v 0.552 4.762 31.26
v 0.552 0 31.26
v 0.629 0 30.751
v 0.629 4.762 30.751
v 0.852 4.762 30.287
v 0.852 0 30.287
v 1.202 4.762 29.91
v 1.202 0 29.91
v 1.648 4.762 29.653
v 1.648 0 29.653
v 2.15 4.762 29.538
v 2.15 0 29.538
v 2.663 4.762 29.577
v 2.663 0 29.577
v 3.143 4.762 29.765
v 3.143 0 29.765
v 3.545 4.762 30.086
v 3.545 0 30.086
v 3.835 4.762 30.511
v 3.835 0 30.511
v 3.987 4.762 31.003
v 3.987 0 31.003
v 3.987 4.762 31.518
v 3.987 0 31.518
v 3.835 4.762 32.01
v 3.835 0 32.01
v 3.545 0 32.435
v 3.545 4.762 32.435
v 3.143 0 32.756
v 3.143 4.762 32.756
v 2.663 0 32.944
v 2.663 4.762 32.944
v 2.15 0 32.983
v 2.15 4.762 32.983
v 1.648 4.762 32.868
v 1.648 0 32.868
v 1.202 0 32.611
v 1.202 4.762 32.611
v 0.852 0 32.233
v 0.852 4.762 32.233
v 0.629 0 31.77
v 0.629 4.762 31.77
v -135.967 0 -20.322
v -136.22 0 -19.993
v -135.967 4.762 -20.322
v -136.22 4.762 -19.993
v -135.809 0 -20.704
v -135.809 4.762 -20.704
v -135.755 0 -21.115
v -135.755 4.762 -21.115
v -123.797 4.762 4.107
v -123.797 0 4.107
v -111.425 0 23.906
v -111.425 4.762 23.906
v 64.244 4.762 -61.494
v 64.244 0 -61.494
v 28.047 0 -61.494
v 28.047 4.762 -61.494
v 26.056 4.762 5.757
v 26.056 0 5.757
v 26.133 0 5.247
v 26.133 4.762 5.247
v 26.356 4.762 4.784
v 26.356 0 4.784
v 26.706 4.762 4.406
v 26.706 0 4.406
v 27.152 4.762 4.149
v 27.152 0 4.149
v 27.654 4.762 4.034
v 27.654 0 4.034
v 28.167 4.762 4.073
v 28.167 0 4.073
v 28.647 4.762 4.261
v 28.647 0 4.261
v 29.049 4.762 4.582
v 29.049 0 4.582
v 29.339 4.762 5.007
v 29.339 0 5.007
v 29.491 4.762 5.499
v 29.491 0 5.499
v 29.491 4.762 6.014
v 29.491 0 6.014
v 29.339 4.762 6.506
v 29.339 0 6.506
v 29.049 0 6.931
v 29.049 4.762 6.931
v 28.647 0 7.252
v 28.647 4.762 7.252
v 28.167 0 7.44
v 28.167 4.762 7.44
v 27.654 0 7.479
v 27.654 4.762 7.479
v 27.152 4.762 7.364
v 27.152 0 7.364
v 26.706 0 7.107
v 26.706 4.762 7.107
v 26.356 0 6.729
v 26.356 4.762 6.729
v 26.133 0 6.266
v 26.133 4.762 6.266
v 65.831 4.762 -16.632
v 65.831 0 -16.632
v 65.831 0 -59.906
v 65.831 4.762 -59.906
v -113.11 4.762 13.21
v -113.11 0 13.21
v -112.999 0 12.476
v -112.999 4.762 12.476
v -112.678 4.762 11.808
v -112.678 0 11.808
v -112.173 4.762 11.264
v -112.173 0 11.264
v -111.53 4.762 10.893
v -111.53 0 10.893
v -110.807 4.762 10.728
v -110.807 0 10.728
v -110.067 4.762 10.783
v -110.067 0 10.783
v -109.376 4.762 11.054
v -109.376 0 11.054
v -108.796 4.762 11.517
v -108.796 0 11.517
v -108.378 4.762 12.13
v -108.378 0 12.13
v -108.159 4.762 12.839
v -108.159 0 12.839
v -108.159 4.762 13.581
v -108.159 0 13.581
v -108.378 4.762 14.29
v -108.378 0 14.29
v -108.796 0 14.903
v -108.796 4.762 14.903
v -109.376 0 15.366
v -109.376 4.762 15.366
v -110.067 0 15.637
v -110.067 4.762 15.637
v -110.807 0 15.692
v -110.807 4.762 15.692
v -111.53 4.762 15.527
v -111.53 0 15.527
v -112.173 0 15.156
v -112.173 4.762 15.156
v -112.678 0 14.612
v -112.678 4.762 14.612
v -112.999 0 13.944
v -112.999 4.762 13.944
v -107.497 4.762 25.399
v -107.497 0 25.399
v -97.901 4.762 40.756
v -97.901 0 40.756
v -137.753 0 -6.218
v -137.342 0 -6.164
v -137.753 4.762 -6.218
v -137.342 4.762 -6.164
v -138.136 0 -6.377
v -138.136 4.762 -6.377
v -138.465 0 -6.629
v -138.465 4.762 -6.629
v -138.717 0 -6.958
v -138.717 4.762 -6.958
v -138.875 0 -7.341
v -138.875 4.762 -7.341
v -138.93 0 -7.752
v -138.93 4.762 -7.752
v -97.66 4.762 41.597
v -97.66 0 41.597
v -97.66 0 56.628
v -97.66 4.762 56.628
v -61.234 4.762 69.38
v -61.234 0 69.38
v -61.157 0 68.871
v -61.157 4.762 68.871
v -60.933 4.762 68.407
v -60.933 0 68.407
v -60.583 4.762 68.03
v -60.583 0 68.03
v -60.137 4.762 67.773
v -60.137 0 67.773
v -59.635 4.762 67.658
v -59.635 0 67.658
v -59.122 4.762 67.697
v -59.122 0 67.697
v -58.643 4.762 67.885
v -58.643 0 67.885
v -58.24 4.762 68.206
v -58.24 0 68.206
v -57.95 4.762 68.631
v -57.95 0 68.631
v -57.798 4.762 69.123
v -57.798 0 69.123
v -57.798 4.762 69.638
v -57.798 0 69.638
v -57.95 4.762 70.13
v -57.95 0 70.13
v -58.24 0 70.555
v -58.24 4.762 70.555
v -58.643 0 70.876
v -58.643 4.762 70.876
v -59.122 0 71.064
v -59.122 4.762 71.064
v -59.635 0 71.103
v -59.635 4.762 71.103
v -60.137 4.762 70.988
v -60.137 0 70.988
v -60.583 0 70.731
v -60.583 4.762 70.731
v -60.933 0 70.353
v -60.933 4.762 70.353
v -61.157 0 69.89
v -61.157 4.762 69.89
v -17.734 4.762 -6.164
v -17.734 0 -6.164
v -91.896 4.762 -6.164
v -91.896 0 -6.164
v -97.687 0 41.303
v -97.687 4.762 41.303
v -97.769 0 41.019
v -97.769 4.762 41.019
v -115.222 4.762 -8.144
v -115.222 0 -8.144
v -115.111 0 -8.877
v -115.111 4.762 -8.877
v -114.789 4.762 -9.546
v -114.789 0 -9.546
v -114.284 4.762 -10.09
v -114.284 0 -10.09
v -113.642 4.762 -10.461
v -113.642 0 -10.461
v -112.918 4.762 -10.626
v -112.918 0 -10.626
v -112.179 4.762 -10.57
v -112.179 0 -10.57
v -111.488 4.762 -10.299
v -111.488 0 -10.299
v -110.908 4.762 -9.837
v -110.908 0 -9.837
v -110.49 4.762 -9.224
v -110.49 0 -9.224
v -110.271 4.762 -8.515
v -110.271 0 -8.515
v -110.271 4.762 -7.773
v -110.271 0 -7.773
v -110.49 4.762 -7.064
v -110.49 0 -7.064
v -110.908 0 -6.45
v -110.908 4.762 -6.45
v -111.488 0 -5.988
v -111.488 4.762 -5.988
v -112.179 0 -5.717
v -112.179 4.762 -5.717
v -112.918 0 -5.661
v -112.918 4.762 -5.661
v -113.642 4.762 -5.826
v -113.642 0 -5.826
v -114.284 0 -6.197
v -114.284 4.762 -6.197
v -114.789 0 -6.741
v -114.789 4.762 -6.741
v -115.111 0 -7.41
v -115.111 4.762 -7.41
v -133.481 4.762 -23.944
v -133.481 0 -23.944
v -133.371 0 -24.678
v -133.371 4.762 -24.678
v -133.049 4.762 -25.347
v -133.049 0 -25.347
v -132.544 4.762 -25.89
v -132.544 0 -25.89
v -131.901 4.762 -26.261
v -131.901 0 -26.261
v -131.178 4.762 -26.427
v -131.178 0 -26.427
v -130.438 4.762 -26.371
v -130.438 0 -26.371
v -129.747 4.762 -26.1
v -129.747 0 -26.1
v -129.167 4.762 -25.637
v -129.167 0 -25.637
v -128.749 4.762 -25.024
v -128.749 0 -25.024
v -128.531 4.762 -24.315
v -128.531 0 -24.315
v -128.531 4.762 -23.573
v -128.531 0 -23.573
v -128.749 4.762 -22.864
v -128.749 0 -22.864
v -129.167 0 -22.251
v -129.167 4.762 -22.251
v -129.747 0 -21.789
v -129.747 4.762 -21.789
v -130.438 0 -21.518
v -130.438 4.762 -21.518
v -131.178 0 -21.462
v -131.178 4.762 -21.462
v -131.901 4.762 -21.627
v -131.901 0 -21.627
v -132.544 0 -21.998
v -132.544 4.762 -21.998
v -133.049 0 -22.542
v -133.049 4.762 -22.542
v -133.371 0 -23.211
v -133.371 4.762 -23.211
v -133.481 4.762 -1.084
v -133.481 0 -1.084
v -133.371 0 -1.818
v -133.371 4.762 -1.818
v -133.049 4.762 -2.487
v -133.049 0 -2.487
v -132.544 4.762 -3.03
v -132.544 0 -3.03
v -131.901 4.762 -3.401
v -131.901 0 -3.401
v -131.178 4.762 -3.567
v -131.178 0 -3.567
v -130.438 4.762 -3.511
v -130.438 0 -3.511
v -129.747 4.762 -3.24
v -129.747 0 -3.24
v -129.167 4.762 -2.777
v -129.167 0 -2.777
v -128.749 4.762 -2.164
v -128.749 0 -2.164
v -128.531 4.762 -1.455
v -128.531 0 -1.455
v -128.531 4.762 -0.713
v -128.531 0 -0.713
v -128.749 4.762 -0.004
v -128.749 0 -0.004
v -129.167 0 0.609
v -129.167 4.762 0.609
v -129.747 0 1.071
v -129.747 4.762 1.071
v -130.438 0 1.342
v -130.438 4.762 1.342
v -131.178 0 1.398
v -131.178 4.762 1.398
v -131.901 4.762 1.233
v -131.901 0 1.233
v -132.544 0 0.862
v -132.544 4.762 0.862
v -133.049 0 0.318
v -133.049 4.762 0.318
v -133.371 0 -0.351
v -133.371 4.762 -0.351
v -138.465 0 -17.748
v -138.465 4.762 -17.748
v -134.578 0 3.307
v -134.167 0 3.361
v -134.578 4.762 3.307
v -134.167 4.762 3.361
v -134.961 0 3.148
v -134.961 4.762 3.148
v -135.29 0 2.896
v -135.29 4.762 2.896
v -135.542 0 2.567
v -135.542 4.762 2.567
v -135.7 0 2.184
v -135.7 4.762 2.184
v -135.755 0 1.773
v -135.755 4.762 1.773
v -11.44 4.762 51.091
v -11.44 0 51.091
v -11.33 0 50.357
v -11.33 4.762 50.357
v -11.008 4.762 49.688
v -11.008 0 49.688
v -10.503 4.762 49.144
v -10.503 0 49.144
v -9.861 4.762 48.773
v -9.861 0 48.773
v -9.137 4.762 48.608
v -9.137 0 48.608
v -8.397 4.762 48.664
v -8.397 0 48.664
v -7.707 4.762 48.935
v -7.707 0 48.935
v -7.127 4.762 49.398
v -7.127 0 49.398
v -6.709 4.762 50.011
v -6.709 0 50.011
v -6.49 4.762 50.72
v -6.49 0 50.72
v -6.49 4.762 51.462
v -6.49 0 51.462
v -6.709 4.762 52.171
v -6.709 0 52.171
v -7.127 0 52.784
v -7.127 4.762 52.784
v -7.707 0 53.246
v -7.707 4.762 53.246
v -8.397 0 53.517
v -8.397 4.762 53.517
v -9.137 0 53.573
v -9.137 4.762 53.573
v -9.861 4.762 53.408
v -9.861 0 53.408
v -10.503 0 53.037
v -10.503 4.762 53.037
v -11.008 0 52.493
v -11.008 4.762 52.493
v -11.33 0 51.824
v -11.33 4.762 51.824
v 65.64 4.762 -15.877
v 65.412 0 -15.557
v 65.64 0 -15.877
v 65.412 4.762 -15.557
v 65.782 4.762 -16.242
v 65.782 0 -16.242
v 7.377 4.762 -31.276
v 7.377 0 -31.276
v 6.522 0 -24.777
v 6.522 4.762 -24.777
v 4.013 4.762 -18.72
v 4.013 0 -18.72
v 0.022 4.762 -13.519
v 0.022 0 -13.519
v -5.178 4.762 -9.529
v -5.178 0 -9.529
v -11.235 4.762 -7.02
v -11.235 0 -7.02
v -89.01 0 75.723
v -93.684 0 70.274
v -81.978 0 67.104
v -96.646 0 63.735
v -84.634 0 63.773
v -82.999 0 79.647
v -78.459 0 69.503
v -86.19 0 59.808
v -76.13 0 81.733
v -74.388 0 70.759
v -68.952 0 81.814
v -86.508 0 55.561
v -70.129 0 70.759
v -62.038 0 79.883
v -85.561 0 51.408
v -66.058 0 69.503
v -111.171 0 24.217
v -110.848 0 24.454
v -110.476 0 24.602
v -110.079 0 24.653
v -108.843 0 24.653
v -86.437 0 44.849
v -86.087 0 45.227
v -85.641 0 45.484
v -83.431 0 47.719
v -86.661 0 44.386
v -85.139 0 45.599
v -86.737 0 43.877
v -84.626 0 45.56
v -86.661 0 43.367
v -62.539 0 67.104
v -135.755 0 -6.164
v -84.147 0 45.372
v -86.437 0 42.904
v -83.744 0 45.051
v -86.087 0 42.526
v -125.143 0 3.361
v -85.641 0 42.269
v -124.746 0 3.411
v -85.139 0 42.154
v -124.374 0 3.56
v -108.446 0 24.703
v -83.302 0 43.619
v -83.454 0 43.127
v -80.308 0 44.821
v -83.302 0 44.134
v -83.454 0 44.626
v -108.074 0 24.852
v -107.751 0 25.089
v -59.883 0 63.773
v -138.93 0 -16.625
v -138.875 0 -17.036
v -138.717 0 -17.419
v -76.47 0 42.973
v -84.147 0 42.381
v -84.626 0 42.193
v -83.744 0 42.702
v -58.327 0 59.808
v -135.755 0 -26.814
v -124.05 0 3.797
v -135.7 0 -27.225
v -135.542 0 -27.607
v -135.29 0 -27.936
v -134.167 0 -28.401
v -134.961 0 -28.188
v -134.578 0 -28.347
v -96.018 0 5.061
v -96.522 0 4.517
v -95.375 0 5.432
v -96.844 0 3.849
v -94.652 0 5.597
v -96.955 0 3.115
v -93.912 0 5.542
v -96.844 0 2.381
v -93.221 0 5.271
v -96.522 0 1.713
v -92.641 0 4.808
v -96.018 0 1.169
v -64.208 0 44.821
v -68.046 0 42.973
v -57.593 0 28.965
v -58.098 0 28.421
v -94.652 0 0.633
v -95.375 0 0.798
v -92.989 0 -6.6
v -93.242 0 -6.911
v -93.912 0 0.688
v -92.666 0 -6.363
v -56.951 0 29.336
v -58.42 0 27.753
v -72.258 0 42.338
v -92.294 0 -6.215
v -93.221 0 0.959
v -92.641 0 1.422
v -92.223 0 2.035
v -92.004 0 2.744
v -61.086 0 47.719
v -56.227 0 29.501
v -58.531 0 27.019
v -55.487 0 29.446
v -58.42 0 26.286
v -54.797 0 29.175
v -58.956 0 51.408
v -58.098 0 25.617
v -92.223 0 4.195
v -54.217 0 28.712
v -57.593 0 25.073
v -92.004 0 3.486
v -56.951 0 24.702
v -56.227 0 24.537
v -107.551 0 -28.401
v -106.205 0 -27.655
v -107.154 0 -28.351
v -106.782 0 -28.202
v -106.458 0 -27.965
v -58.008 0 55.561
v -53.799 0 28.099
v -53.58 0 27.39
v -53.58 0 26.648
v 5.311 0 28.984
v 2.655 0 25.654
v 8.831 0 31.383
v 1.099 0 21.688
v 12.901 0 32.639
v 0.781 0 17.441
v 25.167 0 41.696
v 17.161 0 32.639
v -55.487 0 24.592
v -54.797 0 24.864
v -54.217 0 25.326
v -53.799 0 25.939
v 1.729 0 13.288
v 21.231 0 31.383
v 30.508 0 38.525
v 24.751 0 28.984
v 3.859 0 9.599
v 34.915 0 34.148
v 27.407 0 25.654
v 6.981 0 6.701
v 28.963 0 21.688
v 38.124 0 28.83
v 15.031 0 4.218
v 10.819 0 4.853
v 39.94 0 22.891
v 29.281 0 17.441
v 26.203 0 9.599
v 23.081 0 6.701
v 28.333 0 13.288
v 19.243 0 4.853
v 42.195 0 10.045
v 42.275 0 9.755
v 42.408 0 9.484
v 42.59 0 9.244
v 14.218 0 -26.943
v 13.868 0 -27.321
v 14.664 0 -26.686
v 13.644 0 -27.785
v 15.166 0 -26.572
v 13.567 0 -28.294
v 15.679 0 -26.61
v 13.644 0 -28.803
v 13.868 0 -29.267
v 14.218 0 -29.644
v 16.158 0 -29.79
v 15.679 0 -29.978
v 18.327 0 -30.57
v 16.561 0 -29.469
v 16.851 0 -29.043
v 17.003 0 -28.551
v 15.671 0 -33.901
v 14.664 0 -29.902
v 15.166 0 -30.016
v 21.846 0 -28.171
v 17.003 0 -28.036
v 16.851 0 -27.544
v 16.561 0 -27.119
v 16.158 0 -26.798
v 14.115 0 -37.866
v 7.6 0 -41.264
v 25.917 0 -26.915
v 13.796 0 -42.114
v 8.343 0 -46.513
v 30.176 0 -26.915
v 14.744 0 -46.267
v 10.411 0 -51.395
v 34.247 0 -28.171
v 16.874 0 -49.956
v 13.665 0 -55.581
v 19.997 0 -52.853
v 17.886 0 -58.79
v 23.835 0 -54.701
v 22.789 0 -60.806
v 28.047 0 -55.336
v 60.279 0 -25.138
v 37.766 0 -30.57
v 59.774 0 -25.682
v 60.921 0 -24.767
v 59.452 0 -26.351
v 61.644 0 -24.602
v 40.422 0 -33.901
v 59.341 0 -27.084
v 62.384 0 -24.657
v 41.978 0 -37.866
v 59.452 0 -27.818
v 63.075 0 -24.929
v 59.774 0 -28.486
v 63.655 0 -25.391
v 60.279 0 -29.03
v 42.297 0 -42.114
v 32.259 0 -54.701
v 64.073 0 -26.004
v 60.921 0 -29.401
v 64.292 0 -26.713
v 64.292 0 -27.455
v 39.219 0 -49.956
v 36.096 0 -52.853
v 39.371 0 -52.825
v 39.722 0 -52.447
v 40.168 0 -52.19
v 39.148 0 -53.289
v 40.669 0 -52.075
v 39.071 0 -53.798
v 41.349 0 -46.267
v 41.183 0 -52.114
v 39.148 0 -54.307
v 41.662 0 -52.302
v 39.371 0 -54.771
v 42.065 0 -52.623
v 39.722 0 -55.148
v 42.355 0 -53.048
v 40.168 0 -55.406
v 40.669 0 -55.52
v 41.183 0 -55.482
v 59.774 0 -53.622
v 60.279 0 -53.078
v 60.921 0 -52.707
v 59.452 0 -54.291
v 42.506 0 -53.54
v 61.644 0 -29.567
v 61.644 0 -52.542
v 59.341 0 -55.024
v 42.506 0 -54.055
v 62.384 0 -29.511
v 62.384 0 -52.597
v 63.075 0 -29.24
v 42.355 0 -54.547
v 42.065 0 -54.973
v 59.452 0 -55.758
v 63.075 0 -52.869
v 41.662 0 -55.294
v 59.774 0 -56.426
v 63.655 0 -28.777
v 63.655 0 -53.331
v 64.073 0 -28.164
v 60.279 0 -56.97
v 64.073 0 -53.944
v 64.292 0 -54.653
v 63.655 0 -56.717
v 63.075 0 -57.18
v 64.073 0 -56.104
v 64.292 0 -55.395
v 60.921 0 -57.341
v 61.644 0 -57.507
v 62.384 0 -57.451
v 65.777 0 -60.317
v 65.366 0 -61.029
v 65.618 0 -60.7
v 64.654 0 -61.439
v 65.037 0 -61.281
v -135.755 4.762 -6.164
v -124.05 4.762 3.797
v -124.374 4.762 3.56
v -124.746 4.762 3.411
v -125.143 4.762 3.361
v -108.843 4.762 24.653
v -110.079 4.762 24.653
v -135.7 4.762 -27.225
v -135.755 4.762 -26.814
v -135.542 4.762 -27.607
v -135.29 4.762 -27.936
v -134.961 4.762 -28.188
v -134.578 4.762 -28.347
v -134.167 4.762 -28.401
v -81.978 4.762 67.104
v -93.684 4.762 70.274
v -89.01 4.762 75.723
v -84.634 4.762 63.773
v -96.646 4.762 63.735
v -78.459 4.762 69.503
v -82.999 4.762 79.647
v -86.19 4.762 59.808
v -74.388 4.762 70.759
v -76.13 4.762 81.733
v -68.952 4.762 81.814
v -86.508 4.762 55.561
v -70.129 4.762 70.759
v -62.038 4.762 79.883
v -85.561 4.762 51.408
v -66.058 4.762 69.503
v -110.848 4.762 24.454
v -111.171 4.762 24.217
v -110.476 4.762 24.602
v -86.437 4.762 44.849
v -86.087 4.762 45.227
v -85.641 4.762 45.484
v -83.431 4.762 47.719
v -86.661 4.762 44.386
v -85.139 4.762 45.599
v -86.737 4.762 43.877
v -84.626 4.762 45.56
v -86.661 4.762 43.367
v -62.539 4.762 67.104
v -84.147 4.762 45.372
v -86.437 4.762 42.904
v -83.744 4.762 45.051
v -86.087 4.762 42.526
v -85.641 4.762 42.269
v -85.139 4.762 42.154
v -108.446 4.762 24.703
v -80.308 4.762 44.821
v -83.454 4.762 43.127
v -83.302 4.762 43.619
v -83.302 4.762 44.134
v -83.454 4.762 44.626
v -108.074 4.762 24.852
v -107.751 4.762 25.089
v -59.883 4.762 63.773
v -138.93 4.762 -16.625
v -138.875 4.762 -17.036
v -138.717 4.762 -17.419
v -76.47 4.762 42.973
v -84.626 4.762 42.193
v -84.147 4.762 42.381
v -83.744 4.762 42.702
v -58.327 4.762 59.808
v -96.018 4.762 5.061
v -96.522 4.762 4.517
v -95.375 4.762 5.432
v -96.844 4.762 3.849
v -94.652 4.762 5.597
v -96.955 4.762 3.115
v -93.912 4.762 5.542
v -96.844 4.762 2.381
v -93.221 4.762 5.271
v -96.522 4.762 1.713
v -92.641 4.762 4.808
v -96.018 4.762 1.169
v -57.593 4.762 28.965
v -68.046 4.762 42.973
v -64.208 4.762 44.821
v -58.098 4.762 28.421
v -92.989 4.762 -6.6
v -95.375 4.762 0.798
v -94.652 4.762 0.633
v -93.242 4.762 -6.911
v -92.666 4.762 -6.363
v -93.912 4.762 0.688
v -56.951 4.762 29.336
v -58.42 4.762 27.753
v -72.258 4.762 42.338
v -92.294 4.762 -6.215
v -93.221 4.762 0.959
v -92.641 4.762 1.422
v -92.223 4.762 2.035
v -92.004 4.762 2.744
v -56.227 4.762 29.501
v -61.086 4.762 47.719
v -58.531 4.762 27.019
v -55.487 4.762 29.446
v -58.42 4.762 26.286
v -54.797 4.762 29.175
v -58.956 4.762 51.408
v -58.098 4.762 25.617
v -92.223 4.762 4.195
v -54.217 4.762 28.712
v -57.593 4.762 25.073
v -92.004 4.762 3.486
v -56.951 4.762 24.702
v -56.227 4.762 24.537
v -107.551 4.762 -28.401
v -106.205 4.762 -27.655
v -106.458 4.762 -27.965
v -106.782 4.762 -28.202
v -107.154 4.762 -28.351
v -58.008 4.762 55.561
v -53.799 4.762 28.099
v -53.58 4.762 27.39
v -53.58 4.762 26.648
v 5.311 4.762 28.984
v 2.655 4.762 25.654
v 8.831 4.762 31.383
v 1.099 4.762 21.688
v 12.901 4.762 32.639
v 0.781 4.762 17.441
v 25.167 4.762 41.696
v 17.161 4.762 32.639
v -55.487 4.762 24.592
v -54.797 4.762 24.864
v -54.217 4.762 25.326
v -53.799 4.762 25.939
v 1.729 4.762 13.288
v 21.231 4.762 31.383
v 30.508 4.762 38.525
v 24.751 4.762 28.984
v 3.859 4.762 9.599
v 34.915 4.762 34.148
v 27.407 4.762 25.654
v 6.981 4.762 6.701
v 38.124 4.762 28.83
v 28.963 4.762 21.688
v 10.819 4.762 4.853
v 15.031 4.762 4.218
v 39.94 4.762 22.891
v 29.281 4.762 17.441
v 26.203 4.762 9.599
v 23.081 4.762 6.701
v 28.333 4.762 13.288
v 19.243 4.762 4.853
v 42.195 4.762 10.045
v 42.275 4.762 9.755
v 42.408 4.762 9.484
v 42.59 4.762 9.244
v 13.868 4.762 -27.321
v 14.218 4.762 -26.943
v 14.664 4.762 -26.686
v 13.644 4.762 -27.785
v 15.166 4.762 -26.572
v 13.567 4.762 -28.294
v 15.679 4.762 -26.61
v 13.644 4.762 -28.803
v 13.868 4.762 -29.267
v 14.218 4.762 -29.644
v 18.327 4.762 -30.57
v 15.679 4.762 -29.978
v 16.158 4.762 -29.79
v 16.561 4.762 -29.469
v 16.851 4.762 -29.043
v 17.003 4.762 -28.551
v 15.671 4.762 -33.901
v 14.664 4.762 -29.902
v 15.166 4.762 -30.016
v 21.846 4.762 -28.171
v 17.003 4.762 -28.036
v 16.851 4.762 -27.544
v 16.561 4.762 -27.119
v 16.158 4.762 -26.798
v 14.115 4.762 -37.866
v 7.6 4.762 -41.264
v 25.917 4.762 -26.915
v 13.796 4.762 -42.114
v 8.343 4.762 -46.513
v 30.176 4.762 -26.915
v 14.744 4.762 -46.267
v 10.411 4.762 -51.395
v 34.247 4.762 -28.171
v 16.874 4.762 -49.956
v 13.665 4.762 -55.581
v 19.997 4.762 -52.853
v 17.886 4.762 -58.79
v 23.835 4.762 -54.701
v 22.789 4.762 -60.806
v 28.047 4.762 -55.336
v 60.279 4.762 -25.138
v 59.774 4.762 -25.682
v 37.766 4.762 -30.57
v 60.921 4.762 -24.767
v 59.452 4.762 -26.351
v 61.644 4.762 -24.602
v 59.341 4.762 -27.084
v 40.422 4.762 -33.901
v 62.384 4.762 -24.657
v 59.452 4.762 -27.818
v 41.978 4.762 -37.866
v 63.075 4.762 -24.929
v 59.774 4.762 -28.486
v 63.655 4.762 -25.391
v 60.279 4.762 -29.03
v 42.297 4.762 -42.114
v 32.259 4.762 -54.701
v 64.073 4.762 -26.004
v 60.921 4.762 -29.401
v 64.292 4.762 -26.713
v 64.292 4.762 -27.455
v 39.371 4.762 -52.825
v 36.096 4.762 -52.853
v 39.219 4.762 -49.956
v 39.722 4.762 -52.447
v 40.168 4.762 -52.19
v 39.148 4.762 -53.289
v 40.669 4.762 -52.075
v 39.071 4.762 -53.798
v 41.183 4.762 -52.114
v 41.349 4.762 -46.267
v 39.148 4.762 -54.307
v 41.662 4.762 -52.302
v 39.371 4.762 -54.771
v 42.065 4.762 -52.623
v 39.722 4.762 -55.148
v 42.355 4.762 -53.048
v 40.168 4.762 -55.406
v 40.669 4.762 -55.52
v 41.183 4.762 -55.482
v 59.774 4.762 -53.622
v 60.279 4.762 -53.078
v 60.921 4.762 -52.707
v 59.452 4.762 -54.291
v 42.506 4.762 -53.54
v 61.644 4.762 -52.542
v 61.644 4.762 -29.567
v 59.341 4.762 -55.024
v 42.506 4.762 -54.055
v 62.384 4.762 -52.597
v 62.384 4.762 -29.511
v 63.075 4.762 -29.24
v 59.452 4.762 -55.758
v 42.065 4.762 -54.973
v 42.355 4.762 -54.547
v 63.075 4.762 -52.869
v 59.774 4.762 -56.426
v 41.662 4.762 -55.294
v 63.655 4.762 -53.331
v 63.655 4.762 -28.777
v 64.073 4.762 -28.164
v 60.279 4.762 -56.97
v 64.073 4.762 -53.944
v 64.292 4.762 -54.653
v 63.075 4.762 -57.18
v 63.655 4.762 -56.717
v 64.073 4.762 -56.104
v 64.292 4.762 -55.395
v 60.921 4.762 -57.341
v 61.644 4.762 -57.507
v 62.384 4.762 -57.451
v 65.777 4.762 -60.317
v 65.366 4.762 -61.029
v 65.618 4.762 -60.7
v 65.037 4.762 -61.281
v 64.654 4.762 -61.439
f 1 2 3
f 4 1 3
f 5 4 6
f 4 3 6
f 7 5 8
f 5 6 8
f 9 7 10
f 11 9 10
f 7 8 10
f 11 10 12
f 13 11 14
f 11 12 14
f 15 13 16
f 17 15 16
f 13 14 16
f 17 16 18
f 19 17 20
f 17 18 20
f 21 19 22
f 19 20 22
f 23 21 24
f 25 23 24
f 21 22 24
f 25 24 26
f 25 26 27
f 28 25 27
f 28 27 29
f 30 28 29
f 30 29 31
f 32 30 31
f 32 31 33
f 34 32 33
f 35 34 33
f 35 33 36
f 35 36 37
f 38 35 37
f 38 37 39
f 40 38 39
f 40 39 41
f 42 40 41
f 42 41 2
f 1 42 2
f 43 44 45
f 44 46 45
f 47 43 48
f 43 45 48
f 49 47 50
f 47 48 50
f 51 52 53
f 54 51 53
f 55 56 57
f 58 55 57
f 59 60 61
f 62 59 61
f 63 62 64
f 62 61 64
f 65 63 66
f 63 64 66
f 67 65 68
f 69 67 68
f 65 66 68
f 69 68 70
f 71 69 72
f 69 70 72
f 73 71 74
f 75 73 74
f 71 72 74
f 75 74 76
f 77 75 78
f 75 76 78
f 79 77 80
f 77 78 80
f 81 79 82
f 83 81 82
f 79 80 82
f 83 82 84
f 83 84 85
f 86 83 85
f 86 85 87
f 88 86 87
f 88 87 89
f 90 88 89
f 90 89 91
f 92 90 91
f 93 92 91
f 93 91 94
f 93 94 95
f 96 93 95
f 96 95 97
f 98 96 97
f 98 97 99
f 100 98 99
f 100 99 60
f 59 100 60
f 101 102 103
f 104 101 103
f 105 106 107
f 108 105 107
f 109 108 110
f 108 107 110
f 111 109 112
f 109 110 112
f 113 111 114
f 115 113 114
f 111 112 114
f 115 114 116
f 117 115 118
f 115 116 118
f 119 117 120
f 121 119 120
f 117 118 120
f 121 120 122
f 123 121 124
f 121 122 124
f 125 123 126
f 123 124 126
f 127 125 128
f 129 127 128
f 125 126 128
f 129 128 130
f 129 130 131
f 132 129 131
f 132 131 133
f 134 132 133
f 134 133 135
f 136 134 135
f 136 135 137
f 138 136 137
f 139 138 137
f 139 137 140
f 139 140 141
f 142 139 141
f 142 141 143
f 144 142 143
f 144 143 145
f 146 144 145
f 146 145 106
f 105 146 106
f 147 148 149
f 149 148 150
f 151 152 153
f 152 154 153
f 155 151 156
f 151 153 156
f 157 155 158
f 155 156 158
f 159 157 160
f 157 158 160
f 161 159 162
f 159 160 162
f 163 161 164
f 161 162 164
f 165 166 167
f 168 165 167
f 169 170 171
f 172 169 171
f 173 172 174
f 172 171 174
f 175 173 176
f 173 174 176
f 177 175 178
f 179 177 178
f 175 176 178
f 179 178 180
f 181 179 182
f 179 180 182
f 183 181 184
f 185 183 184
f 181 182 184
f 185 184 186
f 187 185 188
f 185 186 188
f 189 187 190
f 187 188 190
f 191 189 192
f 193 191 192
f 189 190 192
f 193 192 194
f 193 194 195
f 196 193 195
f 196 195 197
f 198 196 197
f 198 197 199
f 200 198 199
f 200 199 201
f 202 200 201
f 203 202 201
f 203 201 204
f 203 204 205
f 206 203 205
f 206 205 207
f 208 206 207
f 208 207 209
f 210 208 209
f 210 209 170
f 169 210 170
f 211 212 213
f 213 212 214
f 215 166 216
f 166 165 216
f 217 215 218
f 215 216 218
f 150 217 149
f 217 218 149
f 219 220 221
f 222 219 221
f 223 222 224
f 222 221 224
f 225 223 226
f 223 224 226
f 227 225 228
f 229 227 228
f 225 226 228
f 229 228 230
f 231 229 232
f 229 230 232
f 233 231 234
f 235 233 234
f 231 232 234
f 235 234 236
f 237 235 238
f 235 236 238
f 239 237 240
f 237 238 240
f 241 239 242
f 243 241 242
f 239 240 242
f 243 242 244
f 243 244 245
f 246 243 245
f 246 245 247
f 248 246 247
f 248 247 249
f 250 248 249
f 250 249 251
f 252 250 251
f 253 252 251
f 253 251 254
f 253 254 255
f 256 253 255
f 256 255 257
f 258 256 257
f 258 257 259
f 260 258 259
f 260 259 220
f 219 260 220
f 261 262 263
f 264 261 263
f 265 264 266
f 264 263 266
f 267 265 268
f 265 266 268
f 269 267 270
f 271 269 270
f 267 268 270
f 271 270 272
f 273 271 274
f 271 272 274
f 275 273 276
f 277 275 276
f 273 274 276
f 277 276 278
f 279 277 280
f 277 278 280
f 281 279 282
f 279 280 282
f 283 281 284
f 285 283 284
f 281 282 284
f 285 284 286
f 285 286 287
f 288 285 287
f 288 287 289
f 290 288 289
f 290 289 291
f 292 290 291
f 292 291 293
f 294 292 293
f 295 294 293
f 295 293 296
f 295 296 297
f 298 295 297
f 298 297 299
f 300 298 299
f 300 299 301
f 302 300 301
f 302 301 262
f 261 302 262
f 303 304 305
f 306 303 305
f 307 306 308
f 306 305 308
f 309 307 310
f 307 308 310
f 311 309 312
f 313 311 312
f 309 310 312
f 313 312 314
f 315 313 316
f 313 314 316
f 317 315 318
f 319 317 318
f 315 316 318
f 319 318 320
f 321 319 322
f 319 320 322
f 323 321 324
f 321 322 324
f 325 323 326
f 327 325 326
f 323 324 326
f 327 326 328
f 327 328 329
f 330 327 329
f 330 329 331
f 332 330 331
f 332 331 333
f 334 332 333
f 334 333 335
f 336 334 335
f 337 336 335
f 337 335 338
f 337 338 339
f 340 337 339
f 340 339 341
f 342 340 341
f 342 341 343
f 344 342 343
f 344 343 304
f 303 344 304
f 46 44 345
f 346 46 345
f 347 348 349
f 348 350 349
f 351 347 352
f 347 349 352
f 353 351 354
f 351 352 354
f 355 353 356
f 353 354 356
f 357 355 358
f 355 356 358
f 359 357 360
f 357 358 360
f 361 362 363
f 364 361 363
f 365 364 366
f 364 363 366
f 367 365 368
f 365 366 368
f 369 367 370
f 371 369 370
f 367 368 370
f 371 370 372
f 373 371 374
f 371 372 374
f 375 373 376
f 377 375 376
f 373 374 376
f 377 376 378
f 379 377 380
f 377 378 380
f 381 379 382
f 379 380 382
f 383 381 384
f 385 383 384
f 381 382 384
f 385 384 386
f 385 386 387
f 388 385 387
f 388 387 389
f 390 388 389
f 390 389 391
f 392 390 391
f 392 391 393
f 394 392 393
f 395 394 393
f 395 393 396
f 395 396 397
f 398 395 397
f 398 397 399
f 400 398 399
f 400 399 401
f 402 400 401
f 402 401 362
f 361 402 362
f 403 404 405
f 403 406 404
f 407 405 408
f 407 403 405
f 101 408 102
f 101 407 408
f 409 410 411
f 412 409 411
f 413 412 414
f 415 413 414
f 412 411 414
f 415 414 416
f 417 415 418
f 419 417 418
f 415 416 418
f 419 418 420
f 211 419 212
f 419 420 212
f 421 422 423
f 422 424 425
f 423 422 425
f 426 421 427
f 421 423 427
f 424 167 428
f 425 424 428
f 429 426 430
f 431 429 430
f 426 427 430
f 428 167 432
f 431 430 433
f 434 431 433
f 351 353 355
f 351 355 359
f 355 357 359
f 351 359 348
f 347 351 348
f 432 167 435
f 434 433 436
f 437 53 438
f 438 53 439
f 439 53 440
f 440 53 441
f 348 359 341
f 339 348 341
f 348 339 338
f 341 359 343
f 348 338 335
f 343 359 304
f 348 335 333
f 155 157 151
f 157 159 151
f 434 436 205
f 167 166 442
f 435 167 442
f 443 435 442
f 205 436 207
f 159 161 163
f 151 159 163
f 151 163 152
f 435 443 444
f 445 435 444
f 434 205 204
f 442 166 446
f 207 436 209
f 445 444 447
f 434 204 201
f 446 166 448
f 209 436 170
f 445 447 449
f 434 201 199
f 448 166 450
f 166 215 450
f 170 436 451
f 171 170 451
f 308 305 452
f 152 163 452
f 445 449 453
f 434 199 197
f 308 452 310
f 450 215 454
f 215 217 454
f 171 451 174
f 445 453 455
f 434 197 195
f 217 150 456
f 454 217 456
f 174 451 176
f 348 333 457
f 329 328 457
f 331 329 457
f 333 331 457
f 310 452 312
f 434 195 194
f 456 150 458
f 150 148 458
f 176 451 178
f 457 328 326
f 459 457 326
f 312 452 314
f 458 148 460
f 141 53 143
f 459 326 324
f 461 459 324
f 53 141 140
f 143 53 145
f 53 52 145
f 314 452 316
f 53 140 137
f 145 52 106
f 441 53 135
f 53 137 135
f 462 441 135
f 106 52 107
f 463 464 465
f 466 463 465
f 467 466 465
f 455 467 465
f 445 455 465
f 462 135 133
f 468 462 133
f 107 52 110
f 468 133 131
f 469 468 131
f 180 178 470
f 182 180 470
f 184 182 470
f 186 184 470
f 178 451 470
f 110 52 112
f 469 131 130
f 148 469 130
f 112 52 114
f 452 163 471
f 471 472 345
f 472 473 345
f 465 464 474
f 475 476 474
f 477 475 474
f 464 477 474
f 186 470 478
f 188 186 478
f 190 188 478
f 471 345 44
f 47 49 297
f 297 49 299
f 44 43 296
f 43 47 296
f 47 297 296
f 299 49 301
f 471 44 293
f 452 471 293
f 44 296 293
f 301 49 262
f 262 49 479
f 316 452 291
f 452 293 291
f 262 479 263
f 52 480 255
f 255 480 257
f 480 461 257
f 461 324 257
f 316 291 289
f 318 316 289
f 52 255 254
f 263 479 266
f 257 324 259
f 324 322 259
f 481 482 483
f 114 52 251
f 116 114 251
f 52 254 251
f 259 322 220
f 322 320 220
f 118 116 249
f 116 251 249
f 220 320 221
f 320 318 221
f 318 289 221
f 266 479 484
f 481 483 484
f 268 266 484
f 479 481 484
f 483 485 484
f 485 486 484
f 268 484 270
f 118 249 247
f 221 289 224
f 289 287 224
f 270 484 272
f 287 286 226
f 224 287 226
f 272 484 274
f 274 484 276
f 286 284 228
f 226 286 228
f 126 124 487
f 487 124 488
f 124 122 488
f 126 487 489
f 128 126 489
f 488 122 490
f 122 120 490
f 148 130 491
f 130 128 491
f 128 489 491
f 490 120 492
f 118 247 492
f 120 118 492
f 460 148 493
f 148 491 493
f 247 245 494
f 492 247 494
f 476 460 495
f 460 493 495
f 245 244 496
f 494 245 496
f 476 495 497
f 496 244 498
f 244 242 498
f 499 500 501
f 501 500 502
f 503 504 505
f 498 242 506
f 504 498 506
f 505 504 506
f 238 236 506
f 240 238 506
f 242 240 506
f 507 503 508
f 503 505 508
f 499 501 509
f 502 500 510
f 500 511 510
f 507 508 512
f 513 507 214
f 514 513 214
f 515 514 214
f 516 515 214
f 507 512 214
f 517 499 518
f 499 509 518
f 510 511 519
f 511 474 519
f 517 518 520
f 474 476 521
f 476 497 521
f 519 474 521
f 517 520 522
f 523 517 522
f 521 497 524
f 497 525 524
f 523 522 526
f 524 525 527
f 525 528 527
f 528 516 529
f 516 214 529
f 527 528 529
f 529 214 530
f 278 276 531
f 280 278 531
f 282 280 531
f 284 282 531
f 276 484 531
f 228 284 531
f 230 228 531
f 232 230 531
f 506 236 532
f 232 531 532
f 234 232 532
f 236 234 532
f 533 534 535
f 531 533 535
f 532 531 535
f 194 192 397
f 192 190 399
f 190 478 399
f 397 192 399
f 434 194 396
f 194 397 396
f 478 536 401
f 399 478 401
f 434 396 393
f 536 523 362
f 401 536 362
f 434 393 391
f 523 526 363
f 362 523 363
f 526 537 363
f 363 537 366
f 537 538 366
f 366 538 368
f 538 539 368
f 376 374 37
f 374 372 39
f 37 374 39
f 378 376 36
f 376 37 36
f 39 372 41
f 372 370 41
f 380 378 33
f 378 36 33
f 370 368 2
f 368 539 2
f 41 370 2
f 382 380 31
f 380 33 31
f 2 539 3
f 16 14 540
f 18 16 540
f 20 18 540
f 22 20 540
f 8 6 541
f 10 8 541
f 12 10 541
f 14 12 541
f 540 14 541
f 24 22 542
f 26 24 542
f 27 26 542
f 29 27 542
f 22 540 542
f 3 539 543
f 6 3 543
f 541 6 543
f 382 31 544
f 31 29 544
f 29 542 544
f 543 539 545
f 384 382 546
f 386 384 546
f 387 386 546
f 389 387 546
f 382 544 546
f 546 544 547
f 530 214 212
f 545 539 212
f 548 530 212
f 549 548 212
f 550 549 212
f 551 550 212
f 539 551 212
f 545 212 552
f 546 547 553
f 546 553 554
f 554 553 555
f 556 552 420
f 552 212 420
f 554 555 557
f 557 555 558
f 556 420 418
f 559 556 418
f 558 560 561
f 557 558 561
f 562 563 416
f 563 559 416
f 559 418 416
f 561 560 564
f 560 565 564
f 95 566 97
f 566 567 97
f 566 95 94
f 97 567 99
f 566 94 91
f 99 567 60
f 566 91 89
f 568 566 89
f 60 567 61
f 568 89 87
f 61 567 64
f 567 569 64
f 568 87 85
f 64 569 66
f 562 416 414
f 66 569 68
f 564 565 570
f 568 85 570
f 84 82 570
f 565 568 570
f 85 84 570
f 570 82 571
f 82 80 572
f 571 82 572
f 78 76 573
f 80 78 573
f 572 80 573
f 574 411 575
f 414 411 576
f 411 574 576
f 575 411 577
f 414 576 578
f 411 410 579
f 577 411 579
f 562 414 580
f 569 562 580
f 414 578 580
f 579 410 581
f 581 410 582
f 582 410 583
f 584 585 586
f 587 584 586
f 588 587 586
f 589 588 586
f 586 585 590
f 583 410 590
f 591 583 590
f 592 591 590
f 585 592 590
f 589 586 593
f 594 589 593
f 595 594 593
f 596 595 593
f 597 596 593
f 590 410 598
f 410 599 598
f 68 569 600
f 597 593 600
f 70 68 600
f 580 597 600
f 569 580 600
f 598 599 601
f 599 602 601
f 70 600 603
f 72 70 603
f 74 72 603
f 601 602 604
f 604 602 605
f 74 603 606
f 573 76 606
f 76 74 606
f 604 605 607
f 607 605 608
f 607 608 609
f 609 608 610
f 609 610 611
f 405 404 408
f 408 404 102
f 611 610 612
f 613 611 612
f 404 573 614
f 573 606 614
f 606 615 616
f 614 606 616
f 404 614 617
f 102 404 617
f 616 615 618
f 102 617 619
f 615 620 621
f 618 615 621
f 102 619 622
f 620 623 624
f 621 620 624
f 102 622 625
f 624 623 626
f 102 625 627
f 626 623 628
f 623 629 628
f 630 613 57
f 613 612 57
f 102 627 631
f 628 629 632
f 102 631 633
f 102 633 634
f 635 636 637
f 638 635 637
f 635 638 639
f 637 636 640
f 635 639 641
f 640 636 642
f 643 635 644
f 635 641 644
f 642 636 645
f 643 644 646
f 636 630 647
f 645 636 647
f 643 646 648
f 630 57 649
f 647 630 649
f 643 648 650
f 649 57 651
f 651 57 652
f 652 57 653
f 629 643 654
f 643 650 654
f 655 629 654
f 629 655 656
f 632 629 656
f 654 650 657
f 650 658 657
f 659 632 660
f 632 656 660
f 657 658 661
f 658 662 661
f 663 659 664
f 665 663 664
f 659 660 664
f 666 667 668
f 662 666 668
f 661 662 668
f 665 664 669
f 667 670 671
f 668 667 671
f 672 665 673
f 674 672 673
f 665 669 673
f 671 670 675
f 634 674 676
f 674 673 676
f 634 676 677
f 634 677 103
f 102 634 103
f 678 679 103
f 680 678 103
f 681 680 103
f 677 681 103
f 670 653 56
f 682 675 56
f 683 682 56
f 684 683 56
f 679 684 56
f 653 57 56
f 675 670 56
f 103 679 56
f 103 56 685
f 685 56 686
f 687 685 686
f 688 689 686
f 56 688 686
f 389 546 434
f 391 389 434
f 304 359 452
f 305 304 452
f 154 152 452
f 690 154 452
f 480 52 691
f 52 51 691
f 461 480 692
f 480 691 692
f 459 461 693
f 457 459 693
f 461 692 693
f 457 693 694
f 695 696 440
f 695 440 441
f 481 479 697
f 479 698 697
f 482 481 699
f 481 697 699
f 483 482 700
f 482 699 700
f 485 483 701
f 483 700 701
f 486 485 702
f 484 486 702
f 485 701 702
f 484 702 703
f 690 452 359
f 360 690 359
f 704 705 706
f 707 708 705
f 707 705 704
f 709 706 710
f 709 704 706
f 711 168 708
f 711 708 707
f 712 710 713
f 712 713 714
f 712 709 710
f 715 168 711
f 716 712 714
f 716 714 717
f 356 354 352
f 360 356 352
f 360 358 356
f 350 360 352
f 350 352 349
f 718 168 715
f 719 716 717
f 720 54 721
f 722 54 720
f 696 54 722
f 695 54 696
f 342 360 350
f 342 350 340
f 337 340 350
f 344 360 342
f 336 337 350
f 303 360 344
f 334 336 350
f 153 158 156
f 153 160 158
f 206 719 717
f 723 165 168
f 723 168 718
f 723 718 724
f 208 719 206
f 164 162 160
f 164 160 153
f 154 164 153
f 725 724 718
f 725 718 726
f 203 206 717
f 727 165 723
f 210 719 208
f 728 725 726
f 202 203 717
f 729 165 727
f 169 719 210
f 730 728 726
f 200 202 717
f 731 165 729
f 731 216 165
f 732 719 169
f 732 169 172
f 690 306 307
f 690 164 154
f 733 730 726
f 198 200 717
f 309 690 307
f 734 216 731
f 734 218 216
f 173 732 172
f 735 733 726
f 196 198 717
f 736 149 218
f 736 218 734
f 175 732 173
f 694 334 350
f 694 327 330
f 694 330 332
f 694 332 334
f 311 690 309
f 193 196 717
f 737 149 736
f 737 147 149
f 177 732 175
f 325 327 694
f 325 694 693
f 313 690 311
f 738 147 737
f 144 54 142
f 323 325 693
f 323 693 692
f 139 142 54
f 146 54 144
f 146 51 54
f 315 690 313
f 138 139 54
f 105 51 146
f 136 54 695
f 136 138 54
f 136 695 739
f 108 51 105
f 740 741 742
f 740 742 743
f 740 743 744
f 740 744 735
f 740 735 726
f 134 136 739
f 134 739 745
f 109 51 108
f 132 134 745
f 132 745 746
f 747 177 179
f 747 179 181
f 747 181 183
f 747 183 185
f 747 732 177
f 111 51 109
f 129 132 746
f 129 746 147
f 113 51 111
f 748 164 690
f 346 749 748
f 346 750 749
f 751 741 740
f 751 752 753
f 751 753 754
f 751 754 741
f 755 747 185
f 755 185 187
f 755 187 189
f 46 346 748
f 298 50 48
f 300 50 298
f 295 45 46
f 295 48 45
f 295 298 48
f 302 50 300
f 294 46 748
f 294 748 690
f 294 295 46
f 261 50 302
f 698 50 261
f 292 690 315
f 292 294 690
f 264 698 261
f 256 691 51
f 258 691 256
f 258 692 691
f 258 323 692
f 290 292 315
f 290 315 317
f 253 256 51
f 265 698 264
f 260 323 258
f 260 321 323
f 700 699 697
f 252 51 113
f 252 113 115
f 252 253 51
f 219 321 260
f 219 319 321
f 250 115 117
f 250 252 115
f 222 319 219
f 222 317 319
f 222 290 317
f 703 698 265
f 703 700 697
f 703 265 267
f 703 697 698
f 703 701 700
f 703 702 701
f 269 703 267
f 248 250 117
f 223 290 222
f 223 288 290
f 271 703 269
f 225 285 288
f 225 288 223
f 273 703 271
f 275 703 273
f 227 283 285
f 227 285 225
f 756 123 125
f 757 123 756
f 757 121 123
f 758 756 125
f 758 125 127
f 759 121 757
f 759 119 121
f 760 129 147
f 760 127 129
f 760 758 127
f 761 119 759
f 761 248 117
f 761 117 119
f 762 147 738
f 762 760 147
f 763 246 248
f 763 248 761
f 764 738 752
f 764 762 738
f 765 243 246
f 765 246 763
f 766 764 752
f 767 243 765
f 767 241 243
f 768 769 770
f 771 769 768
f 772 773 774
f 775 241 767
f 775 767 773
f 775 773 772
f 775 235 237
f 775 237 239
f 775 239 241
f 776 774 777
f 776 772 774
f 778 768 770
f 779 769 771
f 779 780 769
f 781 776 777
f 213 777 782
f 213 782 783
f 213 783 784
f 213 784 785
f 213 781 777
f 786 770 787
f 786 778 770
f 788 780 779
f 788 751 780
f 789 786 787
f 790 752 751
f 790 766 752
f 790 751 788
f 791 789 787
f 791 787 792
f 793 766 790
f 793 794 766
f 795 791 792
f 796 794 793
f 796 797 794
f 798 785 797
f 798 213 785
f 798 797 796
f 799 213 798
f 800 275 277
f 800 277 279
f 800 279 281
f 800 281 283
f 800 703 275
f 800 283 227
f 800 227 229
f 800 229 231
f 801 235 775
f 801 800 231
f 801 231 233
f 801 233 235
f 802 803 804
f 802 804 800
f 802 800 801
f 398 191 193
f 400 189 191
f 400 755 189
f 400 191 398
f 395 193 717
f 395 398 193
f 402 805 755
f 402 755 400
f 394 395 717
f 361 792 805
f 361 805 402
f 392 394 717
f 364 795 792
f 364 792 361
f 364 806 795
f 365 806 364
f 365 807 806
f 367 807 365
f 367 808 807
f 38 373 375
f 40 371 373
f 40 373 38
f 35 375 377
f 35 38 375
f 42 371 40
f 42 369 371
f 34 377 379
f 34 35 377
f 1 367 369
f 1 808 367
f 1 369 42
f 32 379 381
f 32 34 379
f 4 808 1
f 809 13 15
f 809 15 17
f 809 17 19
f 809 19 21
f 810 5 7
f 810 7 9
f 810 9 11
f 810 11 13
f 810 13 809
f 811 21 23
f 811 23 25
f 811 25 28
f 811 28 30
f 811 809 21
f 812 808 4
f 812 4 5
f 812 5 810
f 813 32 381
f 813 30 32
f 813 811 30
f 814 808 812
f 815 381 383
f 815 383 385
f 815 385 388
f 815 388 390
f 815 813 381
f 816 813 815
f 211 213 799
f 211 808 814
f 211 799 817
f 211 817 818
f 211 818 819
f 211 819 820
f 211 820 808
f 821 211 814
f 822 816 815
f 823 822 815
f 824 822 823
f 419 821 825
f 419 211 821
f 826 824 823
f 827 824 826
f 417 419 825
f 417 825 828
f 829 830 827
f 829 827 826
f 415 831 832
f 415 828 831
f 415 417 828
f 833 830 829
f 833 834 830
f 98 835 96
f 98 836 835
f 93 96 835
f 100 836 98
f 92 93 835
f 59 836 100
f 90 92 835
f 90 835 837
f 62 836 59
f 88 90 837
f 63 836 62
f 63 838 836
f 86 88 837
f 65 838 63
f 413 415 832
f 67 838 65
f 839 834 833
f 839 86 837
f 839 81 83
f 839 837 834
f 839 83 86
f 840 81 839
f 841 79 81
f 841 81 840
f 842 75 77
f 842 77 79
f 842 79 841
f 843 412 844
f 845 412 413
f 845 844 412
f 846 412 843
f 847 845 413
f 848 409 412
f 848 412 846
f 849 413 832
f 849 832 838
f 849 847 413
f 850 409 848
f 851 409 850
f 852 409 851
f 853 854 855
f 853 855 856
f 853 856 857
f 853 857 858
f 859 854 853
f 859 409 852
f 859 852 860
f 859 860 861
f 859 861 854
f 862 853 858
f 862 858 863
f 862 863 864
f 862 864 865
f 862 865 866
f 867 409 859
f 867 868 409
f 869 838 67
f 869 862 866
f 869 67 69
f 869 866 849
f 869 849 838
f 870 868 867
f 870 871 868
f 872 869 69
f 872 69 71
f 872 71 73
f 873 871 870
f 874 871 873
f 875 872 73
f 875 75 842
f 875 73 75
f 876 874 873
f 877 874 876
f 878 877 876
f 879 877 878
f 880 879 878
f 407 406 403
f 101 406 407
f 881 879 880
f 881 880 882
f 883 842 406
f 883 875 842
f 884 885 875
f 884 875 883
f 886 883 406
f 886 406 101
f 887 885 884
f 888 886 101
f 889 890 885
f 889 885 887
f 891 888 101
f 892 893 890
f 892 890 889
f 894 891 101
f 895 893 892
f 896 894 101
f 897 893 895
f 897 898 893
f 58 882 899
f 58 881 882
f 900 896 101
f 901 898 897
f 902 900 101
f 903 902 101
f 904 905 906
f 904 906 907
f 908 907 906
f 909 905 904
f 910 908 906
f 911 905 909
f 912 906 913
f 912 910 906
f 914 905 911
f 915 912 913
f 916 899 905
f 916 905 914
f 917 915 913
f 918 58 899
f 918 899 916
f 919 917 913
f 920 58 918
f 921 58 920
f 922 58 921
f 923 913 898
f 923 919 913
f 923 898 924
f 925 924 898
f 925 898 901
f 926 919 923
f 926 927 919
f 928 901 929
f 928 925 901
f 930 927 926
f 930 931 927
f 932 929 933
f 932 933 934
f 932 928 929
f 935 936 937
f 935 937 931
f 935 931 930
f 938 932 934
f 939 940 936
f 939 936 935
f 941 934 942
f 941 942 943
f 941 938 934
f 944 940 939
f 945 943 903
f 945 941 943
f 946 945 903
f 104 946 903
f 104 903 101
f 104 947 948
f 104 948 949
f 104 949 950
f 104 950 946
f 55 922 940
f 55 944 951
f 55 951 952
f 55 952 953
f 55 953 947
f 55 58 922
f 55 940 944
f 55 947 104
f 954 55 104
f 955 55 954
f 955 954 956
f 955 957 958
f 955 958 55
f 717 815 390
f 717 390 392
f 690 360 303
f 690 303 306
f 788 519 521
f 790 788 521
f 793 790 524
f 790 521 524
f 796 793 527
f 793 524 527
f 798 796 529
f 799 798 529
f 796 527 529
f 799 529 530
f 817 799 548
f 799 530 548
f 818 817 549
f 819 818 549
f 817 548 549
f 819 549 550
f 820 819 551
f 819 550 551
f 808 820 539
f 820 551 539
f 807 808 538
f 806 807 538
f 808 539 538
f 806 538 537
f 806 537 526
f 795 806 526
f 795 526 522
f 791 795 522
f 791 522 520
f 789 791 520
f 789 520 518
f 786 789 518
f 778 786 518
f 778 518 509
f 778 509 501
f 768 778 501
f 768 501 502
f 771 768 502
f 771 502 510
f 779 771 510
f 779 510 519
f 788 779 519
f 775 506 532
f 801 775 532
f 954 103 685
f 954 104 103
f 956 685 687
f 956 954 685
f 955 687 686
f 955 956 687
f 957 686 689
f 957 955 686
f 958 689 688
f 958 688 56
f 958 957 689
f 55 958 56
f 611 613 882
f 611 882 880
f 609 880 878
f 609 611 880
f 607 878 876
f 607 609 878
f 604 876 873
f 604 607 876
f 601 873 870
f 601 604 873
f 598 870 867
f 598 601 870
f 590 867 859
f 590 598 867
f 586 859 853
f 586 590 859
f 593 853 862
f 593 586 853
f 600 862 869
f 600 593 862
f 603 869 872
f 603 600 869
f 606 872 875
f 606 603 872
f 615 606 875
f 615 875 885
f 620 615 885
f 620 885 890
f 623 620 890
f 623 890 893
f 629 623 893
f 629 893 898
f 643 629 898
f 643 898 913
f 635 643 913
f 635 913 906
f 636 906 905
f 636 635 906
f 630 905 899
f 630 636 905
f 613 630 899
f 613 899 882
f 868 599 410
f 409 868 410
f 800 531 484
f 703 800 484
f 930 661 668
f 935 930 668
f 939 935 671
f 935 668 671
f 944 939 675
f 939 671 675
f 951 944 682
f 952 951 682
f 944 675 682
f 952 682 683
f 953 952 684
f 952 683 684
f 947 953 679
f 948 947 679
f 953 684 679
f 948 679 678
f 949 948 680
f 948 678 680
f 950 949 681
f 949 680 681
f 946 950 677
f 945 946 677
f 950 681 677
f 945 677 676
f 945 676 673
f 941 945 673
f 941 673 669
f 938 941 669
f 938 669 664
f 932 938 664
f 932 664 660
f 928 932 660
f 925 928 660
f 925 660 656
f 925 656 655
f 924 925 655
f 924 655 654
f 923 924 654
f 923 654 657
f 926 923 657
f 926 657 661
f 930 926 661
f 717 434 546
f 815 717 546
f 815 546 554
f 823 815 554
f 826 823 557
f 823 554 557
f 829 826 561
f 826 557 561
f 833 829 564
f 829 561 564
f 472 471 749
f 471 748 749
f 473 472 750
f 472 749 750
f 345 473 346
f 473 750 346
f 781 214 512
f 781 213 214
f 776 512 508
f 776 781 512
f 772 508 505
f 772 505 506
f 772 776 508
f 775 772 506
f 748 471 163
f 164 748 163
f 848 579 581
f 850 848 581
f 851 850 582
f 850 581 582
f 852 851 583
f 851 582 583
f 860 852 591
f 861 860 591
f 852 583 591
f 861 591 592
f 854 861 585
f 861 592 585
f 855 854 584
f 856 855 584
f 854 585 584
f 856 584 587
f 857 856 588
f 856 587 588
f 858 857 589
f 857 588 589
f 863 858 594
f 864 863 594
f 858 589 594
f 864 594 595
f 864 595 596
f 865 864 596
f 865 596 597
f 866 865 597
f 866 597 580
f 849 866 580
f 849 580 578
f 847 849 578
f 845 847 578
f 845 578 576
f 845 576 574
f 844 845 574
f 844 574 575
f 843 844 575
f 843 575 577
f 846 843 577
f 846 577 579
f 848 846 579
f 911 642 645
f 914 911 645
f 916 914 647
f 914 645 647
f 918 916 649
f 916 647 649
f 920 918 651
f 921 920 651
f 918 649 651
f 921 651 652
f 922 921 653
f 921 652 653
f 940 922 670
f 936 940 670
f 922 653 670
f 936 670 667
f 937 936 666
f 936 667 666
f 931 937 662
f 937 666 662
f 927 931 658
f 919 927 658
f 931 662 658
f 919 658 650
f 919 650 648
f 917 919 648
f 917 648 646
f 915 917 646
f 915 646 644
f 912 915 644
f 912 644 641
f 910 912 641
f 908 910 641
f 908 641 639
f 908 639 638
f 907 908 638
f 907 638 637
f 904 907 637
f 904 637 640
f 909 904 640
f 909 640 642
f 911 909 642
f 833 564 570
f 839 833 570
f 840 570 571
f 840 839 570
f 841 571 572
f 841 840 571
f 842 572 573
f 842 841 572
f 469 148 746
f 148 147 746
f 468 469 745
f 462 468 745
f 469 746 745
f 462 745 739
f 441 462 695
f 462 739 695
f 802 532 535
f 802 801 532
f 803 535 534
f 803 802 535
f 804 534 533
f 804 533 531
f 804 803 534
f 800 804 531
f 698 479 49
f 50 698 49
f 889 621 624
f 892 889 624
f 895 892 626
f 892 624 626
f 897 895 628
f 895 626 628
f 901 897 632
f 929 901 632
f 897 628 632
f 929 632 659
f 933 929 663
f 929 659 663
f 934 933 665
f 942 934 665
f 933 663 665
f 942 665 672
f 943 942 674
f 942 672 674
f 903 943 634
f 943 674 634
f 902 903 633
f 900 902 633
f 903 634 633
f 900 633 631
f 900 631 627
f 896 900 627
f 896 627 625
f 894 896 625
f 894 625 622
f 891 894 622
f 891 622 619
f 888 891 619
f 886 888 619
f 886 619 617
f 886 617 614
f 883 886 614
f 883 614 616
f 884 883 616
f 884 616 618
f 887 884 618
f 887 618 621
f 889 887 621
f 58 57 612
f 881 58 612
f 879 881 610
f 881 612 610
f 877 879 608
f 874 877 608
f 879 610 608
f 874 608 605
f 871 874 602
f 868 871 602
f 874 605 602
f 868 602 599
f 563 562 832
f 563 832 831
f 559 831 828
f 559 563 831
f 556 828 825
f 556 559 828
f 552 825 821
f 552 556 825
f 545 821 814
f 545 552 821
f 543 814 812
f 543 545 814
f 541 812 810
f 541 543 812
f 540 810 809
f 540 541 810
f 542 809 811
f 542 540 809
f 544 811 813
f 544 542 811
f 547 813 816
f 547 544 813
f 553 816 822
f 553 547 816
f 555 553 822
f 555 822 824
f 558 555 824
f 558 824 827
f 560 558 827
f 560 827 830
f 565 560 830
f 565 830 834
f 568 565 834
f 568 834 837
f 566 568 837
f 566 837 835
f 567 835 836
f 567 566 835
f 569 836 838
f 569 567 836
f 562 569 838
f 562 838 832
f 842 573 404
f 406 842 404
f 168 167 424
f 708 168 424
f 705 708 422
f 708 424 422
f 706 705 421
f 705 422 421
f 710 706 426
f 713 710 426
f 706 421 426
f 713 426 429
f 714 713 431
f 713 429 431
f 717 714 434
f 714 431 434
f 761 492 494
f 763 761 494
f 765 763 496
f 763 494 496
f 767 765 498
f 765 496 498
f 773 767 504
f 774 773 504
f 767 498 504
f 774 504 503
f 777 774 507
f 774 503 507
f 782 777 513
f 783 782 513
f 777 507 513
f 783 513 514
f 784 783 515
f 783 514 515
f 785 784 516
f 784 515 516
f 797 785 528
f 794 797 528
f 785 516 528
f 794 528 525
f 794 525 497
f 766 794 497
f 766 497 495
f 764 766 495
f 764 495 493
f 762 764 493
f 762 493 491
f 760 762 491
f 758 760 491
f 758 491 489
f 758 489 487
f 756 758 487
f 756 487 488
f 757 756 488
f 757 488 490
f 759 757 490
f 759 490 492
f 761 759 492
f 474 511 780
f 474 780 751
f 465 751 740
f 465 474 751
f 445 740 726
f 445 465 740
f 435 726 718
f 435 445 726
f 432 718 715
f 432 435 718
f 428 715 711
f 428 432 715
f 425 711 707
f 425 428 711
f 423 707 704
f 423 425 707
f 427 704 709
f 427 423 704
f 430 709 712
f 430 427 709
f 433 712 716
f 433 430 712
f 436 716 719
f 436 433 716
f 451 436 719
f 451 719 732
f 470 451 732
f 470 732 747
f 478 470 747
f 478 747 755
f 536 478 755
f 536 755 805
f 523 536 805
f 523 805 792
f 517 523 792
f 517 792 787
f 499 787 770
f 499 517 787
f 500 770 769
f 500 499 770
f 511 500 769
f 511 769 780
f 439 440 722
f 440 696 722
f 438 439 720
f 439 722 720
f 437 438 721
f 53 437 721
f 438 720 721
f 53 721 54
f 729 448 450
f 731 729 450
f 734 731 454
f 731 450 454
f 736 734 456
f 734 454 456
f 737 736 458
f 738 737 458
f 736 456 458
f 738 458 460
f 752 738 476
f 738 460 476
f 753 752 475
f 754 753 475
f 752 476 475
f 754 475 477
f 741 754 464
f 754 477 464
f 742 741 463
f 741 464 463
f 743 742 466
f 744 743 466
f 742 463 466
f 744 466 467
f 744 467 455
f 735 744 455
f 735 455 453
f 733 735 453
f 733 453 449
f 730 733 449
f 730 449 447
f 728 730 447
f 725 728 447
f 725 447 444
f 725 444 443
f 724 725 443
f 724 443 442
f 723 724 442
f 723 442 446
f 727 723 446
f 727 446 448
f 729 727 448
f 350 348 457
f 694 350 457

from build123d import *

# Parameters (mm, degrees)
SKETCH1_R                 = 14.29004
BOSS_EXTRUDE1_DEPTH       = 4.7625
F_10_CLEARANCE_HOLE1_D    = 4.9784
F_10_CLEARANCE_HOLE2_D    = 4.9784
TAP_DRILL_FOR_8_32_TAP1_D = 3.4544
F_10_CLEARANCE_HOLE3_D    = 4.9784
FILLET1_R                 = 1.5875


with BuildPart() as part:
    # Sketch1 → Boss-Extrude1 (new body)
    with BuildSketch(Plane(origin=(0, 0, 0), x_dir=(1, 0, 0), z_dir=(0, 1, 0))):
        with BuildLine():
            Line((-62.038222018, -79.883349745), (25.167081601, -41.695780276))
            ThreePointArc((25.167081601, -41.695780276), (34.91524479, -34.148496119), (39.940188099, -22.890693115))
            Line((39.940188099, -22.890693115), (42.275148896, -9.586739751))
            Line((42.275148896, -9.586739751), (65.831008632, 16.012754812))
            Line((65.831008632, 16.012754812), (65.831008632, 61.493591694))
            Line((65.831008632, 61.493591694), (28.046575186, 61.493591694))
            ThreePointArc((28.046575186, 61.493591694), (13.665119108, 55.581463016), (7.599980341, 41.263864189))
            Line((7.599980341, 41.263864189), (7.377499016, 31.276274442))
            ThreePointArc((7.377499016, 31.276274442), (0.022382465, 13.519452313), (-17.734439664, 6.164335762))
            Line((-17.734439664, 6.164335762), (-92.776174625, 6.164335762))
            Line((-92.776174625, 6.164335762), (-106.671272051, 28.401139958))
            Line((-106.671272051, 28.401139958), (-135.754553791, 28.401139958))
            Line((-135.754553791, 28.401139958), (-135.754553791, 20.45773786))
            Line((-135.754553791, 20.45773786), (-138.929553791, 17.28273786))
            Line((-138.929553791, 17.28273786), (-138.929553791, 6.164335762))
            Line((-138.929553791, 6.164335762), (-135.754553791, 6.164335762))
            Line((-135.754553791, 6.164335762), (-135.754553791, -3.360664238))
            Line((-135.754553791, -3.360664238), (-124.263208355, -3.360664238))
            Line((-124.263208355, -3.360664238), (-110.958501432, -24.652646126))
            Line((-110.958501432, -24.652646126), (-107.963388287, -24.652646126))
            Line((-107.963388287, -24.652646126), (-97.659911134, -41.141656383))
            Line((-97.659911134, -41.141656383), (-97.659911134, -56.628468385))
            ThreePointArc((-97.659911134, -56.628468385), (-86.144175153, -77.898718987), (-62.038222018, -79.883349745))
        make_face()
        with Locations(Location((28.046575186, 41.045834415, 0), (0, 0, 90))):
            Circle(SKETCH1_R, mode=Mode.SUBTRACT)
        with Locations(Location((15.031008632, -18.508482198, 0), (0, 0, 90))):
            Circle(SKETCH1_R, mode=Mode.SUBTRACT)
        with Locations(Location((-72.258332946, -56.628468385, 0), (0, 0, 90))):
            Circle(SKETCH1_R, mode=Mode.SUBTRACT)
    extrude(amount=BOSS_EXTRUDE1_DEPTH)

    # #10 Clearance Hole1 (through all)
    with Locations(Plane(origin=(0, 4.7625, 0), x_dir=(1, 0, 0), z_dir=(0, 1, 0))):
        with Locations((61.830508632, 55.024283038), (61.830508632, 27.084283038), (-130.992053791, 23.944335762), (-130.992053791, 1.084335762)):
            Hole(F_10_CLEARANCE_HOLE1_D / 2)

    # #10 Clearance Hole2 (through all)
    with Locations(Plane(origin=(0, 4.7625, 0), x_dir=(1, 0, 0), z_dir=(0, 1, 0))):
        with Locations((-110.620877013, -13.210000682), (-94.465560781, -3.115038698), (-112.732400526, 8.143579493)):
            Hole(F_10_CLEARANCE_HOLE2_D / 2)

    # Tap Drill for #8-32 Tap1 (through all)
    with Locations(Plane(origin=(0, 4.7625, 0), x_dir=(1, 0, 0), z_dir=(0, 1, 0))):
        with Locations((-85.010296638, -43.876504694), (-59.506369254, -69.380432077), (2.27904494, -31.26044589), (27.782972324, -5.756518506), (15.294611495, 28.293870723), (40.798538878, 53.797798107)):
            Hole(TAP_DRILL_FOR_8_32_TAP1_D / 2)

    # #10 Clearance Hole3 (through all)
    with Locations(Plane(origin=(0, 4.7625, 0), x_dir=(1, 0, 0), z_dir=(0, 1, 0))):
        with Locations((-56.041369259, -27.019222928), (-8.951277081, -51.090630662)):
            Hole(F_10_CLEARANCE_HOLE3_D / 2)

    # Fillet1
    fillet1_edges = [part.edges().sort_by_distance(p)[0] for p in [
        (-135.754553791, 2.38125, -20.45773786),
        (-135.754553791, 2.38125, -28.401139958),
        (-106.671272051, 2.38125, -28.401139958),
        (-92.776174625, 2.38125, -6.164335762),
        (65.831008632, 2.38125, -61.493591694),
        (65.831008632, 2.38125, -16.012754812),
        (42.275148896, 2.38125, 9.586739751),
        (-97.659911134, 2.38125, 41.141656383),
        (-107.963388287, 2.38125, 24.652646126),
        (-110.958501432, 2.38125, 24.652646126),
        (-124.263208355, 2.38125, 3.360664238),
        (-135.754553791, 2.38125, 3.360664238),
        (-138.929553791, 2.38125, -6.164335762),
        (-138.929553791, 2.38125, -17.28273786),
    ]]
    fillet(fillet1_edges, radius=FILLET1_R)


solid = part.part
